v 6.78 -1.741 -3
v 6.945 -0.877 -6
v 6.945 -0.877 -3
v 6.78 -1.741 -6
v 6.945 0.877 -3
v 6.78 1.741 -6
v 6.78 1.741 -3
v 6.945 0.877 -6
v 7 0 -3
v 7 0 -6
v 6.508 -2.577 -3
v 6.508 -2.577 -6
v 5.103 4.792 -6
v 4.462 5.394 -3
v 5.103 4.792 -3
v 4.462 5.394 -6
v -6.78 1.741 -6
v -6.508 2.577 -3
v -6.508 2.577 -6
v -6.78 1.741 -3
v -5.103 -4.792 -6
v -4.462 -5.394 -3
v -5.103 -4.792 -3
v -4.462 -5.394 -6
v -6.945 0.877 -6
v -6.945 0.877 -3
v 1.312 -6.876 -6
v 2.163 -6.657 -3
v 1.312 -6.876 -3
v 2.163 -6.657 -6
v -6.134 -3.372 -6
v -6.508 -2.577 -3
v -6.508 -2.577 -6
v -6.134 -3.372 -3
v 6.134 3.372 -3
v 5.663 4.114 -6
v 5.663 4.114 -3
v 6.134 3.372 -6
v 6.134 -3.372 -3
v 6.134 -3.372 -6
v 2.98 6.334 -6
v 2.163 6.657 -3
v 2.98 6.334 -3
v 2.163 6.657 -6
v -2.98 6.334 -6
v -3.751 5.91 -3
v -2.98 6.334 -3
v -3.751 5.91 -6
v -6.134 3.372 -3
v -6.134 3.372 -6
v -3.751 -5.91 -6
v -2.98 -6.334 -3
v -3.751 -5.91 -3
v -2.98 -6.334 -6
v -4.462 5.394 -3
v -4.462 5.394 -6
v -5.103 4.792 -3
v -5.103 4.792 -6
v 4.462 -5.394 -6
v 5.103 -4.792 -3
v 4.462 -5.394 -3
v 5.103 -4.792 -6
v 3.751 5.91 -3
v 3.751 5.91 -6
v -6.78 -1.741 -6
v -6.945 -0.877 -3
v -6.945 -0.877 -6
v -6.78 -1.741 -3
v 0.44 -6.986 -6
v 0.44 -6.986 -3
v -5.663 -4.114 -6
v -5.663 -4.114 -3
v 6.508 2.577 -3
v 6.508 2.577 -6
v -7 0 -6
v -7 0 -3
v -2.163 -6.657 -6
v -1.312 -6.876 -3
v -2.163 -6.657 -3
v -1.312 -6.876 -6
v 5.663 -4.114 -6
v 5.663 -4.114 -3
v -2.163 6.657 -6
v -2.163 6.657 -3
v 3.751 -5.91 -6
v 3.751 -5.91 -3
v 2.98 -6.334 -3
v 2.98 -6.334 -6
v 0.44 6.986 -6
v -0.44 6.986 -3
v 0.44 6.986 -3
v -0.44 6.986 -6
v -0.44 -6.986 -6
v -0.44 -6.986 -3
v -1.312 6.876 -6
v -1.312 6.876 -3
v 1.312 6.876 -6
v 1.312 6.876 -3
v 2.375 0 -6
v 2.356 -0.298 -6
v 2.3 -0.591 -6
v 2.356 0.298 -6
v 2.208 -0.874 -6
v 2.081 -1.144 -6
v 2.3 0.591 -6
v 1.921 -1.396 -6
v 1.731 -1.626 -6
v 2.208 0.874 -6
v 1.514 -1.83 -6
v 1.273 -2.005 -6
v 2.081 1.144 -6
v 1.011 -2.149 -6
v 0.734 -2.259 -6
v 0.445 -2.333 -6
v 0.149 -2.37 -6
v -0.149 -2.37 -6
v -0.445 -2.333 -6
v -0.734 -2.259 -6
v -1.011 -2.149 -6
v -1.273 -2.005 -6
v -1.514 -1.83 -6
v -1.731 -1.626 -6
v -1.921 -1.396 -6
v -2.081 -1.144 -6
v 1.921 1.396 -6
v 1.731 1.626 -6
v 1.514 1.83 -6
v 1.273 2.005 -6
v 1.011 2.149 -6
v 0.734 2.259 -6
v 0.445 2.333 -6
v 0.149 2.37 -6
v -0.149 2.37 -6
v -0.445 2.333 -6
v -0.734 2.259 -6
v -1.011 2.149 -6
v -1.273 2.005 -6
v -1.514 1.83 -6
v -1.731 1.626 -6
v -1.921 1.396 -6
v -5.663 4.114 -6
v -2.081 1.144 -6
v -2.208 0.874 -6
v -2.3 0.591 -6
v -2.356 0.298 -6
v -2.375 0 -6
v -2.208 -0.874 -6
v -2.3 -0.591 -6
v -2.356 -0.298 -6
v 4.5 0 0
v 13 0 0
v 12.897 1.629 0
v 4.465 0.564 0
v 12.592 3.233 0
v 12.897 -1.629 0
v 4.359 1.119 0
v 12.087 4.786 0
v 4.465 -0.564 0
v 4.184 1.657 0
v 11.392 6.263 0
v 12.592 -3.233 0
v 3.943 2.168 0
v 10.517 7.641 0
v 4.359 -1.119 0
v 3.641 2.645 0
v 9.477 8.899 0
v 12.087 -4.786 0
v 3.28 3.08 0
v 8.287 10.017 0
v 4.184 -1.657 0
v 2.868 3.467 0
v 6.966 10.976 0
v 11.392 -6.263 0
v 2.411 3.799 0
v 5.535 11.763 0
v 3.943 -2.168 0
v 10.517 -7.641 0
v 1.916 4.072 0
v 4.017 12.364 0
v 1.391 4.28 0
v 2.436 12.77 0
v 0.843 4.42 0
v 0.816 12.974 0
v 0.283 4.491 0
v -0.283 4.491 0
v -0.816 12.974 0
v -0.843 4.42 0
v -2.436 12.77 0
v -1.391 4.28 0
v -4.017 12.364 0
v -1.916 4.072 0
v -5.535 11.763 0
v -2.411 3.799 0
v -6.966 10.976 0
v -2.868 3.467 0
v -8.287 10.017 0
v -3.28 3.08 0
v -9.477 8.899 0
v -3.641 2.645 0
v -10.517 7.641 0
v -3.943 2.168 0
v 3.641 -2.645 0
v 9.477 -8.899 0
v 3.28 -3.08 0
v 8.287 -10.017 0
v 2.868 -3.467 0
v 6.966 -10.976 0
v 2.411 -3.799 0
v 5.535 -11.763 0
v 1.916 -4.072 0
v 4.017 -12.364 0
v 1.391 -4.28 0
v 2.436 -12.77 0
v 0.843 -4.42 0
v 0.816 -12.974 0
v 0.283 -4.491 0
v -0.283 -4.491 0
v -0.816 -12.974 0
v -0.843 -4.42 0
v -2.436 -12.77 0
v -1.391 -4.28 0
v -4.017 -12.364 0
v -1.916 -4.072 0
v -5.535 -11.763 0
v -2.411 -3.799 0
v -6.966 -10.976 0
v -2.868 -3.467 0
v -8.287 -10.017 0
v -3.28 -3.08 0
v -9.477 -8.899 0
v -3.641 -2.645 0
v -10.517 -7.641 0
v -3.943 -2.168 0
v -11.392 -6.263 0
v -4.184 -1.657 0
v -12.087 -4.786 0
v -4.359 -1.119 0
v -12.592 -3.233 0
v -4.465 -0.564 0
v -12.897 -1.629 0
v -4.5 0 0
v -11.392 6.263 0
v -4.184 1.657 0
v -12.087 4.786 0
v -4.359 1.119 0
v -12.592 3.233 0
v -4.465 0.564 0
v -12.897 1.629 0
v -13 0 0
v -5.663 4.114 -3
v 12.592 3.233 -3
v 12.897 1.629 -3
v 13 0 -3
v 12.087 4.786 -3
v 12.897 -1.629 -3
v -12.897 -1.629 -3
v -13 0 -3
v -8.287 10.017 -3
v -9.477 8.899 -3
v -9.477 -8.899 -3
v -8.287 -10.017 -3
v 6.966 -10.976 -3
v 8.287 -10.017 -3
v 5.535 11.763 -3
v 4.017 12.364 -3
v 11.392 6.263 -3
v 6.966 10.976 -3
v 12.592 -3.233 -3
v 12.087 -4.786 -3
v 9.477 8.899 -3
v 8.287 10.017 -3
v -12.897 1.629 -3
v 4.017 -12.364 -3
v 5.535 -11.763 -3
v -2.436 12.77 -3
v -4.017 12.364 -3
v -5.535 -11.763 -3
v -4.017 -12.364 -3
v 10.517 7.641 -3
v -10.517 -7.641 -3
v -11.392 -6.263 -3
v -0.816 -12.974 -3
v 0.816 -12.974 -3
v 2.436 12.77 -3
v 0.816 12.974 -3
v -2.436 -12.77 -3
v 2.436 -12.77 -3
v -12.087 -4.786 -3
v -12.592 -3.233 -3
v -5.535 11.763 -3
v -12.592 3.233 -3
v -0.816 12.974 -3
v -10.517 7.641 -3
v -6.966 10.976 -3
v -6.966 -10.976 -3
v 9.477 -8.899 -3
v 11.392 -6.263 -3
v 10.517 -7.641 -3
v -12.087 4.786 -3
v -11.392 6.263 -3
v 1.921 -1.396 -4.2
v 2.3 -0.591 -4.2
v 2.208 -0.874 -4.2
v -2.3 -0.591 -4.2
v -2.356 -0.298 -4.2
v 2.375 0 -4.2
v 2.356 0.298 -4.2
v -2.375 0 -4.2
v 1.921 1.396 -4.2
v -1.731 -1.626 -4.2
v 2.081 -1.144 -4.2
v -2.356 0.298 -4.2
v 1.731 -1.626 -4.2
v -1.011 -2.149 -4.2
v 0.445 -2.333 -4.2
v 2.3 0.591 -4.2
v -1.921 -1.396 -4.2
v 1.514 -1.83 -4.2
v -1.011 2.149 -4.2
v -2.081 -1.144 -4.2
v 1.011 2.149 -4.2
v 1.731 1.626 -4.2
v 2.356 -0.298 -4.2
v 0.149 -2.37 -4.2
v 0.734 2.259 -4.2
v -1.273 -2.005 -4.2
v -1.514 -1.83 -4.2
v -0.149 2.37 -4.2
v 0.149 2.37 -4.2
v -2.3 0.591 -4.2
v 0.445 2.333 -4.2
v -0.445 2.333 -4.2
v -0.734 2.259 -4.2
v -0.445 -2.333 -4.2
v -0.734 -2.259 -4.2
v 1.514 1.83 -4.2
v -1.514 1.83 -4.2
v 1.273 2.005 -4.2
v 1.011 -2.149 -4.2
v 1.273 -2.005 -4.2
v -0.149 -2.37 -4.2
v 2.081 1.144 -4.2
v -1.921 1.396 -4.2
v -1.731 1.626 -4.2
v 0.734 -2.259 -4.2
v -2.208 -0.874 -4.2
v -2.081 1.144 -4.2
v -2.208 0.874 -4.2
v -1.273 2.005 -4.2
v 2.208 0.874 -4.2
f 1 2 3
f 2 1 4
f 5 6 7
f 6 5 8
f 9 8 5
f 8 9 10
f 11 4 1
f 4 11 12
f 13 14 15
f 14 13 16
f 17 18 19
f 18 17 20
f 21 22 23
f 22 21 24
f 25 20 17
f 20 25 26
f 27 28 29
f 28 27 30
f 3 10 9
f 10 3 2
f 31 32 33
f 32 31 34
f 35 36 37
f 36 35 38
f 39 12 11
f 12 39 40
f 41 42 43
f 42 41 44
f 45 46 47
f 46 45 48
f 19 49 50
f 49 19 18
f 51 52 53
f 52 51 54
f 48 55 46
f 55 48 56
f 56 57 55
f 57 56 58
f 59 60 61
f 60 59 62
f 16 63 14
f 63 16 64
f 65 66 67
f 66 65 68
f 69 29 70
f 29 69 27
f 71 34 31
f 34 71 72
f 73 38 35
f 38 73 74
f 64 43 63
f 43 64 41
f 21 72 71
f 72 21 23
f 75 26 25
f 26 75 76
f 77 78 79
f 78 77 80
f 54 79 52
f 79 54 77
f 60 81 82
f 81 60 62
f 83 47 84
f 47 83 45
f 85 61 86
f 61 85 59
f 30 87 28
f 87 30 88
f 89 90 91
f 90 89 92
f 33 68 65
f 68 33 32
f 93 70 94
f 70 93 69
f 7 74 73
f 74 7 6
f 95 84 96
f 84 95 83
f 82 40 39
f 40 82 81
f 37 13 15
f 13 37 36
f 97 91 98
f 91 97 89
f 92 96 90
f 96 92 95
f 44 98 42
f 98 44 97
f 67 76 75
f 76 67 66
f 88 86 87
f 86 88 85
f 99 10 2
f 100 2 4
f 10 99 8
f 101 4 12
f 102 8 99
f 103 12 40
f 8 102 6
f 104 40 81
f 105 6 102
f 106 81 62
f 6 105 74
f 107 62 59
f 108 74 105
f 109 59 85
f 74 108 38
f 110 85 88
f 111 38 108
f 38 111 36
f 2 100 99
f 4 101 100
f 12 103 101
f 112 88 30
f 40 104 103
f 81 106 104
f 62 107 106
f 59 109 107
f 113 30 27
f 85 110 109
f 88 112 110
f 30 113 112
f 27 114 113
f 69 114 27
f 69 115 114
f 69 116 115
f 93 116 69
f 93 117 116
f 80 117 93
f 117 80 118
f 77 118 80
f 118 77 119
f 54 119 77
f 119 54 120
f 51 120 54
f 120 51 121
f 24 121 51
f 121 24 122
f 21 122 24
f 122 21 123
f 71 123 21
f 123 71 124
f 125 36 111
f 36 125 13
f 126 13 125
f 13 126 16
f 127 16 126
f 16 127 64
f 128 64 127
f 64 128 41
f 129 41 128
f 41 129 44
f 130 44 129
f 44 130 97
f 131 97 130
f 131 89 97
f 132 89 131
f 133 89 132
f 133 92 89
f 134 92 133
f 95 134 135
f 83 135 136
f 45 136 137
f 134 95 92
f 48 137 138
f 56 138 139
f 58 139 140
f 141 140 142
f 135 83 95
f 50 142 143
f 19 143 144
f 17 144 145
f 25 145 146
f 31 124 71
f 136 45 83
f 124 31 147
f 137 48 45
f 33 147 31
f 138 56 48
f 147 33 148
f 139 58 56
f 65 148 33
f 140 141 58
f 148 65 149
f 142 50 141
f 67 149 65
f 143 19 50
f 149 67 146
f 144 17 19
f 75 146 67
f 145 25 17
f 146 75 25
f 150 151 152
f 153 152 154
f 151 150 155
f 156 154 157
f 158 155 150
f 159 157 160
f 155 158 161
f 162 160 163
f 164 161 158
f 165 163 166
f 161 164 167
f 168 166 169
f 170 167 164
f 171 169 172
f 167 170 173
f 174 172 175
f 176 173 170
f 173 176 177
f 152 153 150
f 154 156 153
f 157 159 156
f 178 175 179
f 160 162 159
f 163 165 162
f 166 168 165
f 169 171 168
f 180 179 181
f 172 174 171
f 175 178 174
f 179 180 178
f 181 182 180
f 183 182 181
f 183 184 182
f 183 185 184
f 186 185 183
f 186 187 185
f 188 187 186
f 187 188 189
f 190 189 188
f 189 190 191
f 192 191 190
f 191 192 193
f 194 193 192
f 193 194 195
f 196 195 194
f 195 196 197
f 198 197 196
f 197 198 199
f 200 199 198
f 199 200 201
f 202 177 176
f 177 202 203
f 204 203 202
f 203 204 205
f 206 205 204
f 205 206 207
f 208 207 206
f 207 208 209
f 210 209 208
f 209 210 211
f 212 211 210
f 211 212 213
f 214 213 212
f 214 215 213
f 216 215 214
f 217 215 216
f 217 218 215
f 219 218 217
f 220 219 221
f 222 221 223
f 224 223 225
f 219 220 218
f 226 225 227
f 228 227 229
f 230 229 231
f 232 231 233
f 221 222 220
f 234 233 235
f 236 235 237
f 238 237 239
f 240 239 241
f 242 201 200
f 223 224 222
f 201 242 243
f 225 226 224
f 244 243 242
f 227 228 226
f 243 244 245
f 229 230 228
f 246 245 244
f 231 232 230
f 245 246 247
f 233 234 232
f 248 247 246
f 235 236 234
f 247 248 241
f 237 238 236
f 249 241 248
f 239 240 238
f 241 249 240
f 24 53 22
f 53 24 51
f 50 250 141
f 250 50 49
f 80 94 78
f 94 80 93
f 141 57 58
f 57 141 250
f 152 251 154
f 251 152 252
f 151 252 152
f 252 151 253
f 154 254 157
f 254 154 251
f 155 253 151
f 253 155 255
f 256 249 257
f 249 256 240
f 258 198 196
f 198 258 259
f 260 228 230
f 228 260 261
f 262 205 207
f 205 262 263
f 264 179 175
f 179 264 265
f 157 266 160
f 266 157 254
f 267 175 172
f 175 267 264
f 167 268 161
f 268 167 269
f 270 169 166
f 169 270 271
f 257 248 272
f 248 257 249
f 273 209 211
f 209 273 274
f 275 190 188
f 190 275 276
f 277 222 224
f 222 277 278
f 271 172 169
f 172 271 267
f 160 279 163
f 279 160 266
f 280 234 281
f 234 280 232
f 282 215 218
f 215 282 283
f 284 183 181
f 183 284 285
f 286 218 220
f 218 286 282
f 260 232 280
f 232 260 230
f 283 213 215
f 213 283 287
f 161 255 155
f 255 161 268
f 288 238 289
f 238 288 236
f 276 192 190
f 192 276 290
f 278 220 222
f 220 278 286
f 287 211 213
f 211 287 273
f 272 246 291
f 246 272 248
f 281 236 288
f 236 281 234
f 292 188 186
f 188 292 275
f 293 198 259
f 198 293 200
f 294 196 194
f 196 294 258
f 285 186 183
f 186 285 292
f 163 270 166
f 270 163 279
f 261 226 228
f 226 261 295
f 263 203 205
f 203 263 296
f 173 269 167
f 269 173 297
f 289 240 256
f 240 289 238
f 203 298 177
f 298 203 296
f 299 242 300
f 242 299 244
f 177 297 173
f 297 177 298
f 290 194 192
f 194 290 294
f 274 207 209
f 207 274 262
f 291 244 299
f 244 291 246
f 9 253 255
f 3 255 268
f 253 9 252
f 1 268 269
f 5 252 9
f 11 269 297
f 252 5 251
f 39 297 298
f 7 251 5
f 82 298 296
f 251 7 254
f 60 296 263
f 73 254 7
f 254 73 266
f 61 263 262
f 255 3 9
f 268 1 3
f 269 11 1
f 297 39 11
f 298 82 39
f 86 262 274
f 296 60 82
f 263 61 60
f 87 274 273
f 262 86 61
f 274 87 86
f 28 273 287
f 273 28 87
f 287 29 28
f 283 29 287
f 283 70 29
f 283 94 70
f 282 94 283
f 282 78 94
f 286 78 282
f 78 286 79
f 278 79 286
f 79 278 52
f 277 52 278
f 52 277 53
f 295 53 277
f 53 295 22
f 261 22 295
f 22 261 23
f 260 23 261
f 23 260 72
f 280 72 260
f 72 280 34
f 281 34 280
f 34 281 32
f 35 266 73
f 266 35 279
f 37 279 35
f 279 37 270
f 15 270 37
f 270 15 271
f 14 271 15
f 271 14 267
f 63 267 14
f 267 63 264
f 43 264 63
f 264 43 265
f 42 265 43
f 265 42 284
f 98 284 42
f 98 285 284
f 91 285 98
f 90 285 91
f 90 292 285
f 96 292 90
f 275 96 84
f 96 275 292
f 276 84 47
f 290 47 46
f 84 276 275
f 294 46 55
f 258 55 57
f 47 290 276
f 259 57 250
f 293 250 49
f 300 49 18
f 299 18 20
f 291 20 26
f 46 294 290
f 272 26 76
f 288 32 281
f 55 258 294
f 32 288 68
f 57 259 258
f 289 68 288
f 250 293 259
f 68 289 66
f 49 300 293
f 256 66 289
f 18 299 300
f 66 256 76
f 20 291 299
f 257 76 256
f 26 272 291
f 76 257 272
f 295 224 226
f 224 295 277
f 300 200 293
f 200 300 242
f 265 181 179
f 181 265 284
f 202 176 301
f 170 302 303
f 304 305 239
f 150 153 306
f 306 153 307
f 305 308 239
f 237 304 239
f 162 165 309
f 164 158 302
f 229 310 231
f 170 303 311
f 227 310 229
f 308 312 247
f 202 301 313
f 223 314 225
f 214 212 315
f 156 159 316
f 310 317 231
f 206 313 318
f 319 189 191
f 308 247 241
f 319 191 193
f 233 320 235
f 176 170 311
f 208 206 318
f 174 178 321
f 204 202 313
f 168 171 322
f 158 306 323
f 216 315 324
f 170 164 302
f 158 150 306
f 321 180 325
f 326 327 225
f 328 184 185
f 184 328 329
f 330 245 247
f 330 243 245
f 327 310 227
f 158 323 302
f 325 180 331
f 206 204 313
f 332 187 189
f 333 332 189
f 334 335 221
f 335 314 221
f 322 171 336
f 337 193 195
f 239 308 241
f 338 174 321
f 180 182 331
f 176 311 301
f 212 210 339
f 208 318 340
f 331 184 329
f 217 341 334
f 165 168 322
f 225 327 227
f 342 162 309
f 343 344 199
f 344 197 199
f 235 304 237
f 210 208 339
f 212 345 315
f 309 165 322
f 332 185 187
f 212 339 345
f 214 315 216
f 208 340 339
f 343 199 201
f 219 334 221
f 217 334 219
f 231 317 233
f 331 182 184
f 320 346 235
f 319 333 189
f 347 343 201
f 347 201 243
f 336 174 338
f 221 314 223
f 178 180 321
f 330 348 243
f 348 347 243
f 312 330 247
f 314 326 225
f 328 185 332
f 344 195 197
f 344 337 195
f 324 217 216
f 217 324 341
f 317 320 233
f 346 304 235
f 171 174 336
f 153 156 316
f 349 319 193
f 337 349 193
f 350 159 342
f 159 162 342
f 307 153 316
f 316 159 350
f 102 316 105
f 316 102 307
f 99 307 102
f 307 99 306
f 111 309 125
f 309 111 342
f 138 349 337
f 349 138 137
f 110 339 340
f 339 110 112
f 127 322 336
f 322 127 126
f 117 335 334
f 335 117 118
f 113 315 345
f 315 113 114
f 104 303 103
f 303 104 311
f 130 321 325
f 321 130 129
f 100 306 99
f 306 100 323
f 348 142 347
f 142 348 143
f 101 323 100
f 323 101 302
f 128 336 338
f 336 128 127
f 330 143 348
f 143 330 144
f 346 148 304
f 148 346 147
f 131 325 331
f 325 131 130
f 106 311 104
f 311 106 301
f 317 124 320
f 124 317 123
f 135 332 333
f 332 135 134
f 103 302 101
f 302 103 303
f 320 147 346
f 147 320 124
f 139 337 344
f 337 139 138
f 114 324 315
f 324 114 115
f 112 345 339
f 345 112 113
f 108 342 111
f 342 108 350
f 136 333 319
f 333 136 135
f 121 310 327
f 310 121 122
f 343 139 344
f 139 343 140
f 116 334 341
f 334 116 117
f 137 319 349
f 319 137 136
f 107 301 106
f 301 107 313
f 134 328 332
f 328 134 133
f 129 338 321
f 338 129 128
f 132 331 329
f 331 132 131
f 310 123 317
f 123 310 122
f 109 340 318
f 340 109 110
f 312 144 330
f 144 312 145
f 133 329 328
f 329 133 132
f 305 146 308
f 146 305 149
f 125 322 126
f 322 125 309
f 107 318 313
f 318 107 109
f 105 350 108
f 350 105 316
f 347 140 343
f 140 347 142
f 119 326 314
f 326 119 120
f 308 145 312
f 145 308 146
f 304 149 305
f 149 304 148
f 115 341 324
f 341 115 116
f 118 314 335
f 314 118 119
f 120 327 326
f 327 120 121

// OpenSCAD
$fn = 50;


difference() {
	union() {
		translate(v = [0, 0, -6.0000000000]) {
			cylinder(h = 6, r = 7.0000000000);
		}
		translate(v = [0, 0, -3.0000000000]) {
			cylinder(h = 3, r = 13.0000000000);
		}
	}
	union() {
		translate(v = [0, 0, 0]) {
			rotate(a = [0, 0, 0]) {
				difference() {
					union() {
						#translate(v = [0, 0, -6.0000000000]) {
							cylinder(h = 6, r = 2.2500000000);
						}
						#translate(v = [0, 0, -4.2000000000]) {
							cylinder(h = 4.2000000000, r1 = 2.3750000000, r2 = 4.5000000000);
						}
						#translate(v = [0, 0, -6.0000000000]) {
							cylinder(h = 6, r = 2.3750000000);
						}
						#translate(v = [0, 0, -6.0000000000]) {
							cylinder(h = 6, r = 2.2500000000);
						}
					}
					union();
				}
			}
		}
	}
}
